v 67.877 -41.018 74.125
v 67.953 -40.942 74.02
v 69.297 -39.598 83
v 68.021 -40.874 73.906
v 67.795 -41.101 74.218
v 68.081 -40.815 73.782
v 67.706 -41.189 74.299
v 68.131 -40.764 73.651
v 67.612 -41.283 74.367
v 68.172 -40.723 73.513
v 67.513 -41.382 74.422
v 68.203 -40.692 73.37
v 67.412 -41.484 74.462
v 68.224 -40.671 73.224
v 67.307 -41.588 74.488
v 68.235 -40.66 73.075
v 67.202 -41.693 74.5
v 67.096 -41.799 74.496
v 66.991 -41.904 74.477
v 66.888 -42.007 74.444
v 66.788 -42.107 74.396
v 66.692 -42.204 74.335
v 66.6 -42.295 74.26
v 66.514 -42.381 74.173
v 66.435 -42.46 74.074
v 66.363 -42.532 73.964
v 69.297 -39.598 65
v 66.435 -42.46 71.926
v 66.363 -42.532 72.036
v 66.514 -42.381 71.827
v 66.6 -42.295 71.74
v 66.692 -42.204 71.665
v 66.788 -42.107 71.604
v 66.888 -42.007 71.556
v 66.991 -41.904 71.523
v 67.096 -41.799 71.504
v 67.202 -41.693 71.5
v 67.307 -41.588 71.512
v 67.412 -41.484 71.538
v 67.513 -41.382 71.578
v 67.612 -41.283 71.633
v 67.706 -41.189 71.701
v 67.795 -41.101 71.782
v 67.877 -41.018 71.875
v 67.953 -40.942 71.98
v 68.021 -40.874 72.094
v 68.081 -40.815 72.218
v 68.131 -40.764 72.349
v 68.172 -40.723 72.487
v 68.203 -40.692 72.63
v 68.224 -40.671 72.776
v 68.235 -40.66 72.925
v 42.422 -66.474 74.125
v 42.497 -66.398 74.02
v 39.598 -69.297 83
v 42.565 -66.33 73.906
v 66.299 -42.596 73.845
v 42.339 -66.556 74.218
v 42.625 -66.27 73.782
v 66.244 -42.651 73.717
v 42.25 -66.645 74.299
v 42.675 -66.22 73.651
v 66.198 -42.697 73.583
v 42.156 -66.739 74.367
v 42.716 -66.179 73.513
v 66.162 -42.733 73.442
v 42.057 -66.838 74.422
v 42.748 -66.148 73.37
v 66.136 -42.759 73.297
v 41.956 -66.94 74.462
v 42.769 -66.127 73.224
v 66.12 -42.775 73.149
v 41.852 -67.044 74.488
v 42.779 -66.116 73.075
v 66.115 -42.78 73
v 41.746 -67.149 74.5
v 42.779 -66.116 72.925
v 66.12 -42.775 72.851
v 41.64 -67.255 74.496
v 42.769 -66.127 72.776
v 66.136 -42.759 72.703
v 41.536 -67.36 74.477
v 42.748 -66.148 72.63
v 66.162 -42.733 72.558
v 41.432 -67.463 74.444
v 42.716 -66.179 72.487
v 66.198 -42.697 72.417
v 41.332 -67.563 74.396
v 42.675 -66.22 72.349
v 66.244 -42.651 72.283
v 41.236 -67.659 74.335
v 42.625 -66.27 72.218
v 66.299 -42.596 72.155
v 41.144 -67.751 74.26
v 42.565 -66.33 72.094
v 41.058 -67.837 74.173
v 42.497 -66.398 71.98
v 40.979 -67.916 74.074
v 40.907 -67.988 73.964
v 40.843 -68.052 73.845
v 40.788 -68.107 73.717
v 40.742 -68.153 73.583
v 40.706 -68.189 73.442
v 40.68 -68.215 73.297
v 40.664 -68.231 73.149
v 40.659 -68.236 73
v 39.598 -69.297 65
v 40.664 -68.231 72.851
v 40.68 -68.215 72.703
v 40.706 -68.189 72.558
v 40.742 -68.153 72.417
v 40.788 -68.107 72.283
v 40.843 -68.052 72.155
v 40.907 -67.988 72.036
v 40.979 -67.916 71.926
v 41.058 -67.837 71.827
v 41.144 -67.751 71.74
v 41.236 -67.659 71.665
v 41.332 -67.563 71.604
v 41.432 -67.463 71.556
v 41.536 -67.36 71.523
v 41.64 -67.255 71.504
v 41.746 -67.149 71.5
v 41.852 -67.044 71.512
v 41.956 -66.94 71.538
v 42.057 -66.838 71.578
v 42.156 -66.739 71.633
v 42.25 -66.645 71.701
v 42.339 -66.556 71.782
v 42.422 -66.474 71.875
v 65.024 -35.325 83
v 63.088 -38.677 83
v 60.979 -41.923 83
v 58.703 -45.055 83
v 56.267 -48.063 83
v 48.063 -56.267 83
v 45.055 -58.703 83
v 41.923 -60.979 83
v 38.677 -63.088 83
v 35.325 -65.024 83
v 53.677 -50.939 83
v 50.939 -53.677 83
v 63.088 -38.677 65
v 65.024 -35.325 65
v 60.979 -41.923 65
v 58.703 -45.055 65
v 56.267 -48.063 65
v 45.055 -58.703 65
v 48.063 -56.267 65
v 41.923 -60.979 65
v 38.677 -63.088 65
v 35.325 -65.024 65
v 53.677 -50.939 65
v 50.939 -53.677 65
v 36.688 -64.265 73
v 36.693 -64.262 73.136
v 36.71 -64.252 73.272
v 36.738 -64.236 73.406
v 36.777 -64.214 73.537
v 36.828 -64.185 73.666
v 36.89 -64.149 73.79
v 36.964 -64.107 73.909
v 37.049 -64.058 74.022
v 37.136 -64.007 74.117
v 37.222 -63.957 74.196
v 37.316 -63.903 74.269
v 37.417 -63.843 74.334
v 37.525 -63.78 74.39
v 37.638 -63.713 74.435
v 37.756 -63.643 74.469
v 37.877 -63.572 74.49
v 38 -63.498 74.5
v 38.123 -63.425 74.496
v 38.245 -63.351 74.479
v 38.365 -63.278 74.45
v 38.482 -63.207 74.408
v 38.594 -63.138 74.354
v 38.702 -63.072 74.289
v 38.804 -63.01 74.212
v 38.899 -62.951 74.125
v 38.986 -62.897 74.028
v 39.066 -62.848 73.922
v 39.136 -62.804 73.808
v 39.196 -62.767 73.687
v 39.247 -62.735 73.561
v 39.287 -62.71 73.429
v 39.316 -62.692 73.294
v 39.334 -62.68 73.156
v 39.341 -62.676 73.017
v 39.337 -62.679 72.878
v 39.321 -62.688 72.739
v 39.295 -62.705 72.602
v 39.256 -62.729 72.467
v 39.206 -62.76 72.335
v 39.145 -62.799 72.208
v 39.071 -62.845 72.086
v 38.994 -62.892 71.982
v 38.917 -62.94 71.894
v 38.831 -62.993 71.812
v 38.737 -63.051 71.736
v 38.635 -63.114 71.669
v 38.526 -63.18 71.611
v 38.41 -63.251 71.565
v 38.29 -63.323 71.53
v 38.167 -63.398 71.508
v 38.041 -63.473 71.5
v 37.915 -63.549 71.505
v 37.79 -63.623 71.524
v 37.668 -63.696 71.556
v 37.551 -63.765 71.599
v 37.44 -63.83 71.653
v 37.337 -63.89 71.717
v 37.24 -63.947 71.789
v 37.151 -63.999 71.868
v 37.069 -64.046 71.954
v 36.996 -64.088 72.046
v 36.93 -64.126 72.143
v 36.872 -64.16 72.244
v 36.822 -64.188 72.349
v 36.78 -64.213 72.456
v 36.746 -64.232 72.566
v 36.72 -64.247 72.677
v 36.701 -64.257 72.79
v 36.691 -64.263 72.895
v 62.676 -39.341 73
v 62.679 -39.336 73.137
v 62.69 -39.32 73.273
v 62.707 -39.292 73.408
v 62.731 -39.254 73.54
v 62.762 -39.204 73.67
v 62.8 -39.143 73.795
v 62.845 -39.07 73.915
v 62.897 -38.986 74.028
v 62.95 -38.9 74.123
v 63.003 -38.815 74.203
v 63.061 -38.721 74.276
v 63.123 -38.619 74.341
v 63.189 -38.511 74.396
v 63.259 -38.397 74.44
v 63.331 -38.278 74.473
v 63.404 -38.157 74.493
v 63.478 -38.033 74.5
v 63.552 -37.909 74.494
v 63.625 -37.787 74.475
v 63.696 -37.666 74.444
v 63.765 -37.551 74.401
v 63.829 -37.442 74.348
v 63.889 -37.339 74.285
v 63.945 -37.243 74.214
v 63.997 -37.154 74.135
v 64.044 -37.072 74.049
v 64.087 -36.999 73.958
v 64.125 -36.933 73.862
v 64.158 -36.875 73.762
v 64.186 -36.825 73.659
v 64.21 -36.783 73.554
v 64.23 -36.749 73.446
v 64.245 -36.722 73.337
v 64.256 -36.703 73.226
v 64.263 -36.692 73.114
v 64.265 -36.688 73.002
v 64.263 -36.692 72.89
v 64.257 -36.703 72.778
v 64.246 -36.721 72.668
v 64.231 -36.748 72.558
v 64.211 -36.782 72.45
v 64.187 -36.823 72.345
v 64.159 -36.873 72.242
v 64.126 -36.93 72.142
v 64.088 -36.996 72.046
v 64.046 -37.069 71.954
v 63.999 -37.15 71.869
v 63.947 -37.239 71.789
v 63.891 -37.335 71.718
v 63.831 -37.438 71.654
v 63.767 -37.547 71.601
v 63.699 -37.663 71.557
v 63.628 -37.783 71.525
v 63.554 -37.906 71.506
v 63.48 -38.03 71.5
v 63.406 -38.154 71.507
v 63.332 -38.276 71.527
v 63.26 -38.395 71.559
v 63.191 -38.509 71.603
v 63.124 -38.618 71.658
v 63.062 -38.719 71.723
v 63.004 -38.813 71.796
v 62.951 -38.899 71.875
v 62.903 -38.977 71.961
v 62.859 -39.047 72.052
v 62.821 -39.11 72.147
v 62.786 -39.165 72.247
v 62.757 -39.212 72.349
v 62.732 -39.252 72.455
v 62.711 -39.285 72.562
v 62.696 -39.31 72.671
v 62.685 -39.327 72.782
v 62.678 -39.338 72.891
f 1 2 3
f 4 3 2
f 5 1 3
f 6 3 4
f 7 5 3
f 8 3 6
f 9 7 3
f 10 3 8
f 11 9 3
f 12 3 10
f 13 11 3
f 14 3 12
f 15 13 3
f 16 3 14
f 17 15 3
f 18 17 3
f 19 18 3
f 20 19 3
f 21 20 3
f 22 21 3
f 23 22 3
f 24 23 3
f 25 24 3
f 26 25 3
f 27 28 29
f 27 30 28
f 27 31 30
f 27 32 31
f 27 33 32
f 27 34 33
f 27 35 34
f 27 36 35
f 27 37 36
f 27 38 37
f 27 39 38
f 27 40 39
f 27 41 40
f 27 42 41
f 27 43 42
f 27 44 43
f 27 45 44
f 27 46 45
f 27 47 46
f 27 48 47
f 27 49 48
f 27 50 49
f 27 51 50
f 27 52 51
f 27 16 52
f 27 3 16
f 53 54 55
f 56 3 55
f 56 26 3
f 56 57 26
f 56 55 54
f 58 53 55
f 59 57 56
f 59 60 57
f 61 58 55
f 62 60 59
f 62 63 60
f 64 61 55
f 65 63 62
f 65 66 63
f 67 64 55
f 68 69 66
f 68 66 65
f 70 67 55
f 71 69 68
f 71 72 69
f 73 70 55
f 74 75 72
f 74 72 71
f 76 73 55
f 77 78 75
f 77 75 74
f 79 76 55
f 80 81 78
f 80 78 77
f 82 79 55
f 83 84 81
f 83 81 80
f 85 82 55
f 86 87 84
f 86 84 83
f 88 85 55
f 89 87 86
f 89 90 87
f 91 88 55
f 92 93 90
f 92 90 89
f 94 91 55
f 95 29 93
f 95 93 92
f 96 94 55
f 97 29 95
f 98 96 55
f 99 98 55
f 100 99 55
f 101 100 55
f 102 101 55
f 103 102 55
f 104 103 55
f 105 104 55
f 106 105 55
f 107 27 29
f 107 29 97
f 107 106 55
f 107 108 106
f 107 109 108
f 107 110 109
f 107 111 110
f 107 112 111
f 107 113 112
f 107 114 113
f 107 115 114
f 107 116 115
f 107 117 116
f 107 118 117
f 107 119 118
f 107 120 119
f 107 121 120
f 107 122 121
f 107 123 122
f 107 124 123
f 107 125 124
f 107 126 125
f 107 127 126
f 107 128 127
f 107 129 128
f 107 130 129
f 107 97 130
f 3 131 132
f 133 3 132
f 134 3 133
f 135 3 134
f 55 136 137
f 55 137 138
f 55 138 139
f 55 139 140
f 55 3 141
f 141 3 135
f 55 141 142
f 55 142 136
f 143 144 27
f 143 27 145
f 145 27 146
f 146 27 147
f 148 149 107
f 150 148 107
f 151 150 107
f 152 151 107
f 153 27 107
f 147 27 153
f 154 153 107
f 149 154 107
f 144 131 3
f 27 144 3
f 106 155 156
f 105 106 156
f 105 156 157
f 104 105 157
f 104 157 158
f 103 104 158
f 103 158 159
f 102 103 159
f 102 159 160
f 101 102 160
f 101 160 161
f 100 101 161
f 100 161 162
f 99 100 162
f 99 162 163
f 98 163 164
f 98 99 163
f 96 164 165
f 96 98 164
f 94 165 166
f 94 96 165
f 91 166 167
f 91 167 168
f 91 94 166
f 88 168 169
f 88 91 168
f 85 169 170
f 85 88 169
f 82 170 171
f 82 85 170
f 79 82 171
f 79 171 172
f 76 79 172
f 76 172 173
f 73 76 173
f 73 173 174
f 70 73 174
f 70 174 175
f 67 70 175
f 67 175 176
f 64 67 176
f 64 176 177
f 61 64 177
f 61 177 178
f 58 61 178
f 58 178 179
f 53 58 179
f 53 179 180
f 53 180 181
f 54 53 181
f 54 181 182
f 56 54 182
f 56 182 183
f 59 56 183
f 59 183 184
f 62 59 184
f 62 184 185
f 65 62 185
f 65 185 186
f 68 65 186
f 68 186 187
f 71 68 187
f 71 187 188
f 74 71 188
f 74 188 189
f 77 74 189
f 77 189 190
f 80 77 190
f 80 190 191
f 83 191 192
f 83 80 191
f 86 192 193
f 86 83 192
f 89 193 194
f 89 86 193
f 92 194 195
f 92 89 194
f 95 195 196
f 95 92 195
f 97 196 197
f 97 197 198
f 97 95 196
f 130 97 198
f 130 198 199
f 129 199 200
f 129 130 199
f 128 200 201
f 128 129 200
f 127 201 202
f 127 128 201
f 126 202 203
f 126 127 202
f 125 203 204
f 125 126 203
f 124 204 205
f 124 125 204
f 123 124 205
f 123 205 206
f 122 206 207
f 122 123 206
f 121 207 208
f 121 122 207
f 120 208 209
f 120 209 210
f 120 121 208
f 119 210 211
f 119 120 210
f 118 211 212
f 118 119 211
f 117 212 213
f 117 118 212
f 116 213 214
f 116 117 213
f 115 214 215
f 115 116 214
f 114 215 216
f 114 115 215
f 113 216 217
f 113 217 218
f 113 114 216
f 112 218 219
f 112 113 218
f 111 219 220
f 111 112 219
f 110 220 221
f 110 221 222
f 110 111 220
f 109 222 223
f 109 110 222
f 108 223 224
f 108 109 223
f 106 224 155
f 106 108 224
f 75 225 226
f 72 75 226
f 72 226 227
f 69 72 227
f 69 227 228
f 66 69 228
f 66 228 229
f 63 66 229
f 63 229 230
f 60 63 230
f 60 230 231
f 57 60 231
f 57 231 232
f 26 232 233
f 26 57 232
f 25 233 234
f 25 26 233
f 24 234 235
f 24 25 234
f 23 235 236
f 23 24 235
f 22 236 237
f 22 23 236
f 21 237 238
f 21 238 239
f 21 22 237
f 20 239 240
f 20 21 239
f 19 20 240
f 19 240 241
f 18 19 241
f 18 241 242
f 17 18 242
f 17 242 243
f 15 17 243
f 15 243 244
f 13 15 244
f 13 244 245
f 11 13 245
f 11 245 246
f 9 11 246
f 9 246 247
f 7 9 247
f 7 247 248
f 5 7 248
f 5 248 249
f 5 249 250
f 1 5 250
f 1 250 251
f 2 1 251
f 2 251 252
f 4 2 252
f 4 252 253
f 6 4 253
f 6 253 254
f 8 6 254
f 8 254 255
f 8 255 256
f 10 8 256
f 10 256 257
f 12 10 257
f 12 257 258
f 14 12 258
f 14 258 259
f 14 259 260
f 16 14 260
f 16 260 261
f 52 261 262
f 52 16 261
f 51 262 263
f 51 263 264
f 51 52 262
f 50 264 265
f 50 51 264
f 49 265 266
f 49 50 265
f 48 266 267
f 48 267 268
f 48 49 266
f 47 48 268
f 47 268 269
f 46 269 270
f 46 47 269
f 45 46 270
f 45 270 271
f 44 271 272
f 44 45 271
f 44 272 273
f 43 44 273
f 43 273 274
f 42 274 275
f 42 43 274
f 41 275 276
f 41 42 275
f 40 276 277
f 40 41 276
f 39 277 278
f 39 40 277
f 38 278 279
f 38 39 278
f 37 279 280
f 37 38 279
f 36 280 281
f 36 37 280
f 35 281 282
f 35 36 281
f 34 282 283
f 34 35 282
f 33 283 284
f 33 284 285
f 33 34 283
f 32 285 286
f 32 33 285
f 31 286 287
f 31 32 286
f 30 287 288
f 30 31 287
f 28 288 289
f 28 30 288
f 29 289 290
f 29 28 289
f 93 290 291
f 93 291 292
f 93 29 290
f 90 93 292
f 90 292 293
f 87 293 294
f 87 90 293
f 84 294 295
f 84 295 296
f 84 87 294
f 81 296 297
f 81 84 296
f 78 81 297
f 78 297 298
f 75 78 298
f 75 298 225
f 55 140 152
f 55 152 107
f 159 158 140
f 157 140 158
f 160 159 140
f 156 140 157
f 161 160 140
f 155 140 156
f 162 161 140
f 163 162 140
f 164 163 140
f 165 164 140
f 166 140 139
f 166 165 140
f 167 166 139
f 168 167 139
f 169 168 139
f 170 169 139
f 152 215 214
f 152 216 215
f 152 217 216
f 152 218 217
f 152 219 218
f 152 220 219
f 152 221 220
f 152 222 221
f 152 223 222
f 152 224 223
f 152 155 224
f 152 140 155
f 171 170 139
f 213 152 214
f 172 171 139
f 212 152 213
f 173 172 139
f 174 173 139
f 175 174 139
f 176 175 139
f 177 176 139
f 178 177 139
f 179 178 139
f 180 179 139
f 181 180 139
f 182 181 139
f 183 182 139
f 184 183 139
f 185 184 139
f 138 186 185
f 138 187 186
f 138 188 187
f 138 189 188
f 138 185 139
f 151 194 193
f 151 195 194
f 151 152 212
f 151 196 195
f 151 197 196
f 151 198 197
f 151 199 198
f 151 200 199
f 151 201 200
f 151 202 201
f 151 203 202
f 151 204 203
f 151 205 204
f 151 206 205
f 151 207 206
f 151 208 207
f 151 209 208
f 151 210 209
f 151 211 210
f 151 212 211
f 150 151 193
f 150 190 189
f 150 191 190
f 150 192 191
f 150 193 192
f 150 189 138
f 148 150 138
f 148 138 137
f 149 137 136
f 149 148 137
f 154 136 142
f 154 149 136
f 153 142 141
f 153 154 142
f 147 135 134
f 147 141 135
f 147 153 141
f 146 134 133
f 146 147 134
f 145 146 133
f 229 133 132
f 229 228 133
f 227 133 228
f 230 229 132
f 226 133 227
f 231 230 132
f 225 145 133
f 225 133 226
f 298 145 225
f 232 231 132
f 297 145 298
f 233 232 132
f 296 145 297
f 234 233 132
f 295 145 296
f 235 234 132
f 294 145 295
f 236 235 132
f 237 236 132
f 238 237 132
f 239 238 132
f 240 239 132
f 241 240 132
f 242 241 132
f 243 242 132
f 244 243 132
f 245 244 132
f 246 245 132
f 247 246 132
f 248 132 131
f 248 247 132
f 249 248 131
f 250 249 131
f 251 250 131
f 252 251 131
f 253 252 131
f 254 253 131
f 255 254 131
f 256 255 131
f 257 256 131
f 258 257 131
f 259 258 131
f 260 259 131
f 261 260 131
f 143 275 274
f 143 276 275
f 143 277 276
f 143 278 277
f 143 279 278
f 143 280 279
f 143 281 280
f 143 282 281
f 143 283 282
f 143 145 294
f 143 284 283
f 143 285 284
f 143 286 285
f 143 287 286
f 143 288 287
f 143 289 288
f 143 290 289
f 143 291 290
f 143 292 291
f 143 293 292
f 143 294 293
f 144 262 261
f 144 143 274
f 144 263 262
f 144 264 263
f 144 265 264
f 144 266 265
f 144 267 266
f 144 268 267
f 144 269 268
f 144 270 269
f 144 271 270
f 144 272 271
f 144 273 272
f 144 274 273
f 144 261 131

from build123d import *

# Parameters (mm, degrees)
CYLINDER1768_R              = 1.5
CYLINDER1768_DEPTH          = 60
CYLINDER1765_R              = 1.5
CYLINDER1765_DEPTH          = 60
CYLINDER1766_R              = 1.5
CYLINDER1766_DEPTH          = 60
CYLINDER1767_R              = 1.5
CYLINDER1767_DEPTH          = 60
COMPOUND900_PLACEMENT_ANGLE = 225
CYLINDER1771_R              = 1.5
CYLINDER1771_DEPTH          = 50
COMPOUND903_PLACEMENT_ANGLE = 225
CYLINDER1770_R              = 1.5
CYLINDER1770_DEPTH          = 50
COMPOUND904_PLACEMENT_ANGLE = 225
CYLINDER1769_R              = 74
CYLINDER1769_DEPTH          = 40
BOX718_W                    = 42
BOX718_H                    = 10
BOX718_DEPTH                = 18
COMPOUND901_PLACEMENT_ANGLE = 225


with BuildPart() as v_lec1768:
    # Cylinder1768 → Cylinder1768 (new body)
    with BuildSketch(Plane(origin=(-24, 73, -80), x_dir=(1, 0, 0), z_dir=(0, 0, 1))):
        Circle(CYLINDER1768_R)
    extrude(amount=CYLINDER1768_DEPTH)


with BuildPart() as v_lec1765:
    # Cylinder1765 → Cylinder1765 (new body)
    with BuildSketch(Plane(origin=(-15, 135, -80), x_dir=(1, 0, 0), z_dir=(0, 0, 1))):
        Circle(CYLINDER1765_R)
    extrude(amount=CYLINDER1765_DEPTH)


with BuildPart() as v_lec1766:
    # Cylinder1766 → Cylinder1766 (new body)
    with BuildSketch(Plane(origin=(15, 135, -80), x_dir=(1, 0, 0), z_dir=(0, 0, 1))):
        Circle(CYLINDER1766_R)
    extrude(amount=CYLINDER1766_DEPTH)


with BuildPart() as compound900:
    # Cylinder1767 → Cylinder1767 (new body)
    with BuildSketch(Plane(origin=(24, 73, -80), x_dir=(1, 0, 0), z_dir=(0, 0, 1))):
        Circle(CYLINDER1767_R)
    extrude(amount=CYLINDER1767_DEPTH)

    # Compound900: union Válec1768, Válec1765, Válec1766
    add(v_lec1768.part)
    add(v_lec1765.part)
    add(v_lec1766.part)


with BuildPart() as compound900_1:
    # Compound900 placement: moved
    add(compound900.part.moved(Location((0, 0, 100))).rotate(Axis((0, 0, 100), (0, 0, 1)), COMPOUND900_PLACEMENT_ANGLE))


with BuildPart() as compound903:
    # Cylinder1771 → Cylinder1771 (new body)
    with BuildSketch(Plane(origin=(18, 100, 72), x_dir=(1, 0, 0), z_dir=(0, -1, 0))):
        Circle(CYLINDER1771_R)
    extrude(amount=CYLINDER1771_DEPTH)


with BuildPart() as compound903_1:
    # Compound903 placement: moved
    add(compound903.part.rotate(Axis((0, 0, 0), (0, 0, 1)), COMPOUND903_PLACEMENT_ANGLE))


with BuildPart() as compound902:
    # Cylinder1770 → Cylinder1770 (new body)
    with BuildSketch(Plane(origin=(-18, 100, 72), x_dir=(1, 0, 0), z_dir=(0, -1, 0))):
        Circle(CYLINDER1770_R)
    extrude(amount=CYLINDER1770_DEPTH)


with BuildPart() as compound902_1:
    # Compound904 placement: moved
    add(compound902.part.rotate(Axis((0, 0, 0), (0, 0, 1)), COMPOUND904_PLACEMENT_ANGLE))

    # Compound902: union Compound903
    add(compound903_1.part)


with BuildPart() as compound902_2:
    # Compound902 placement: moved
    add(compound902_1.part.moved(Location((0, 0, 1))))


with BuildPart() as v_lec1769:
    # Cylinder1769 → Cylinder1769 (new body)
    with BuildSketch(Plane.XY.offset(44)):
        Circle(CYLINDER1769_R)
    extrude(amount=CYLINDER1769_DEPTH)


with BuildPart() as cut527:
    # Box718 → Box718 (new body)
    with BuildSketch(Plane(origin=(-21, -23, 22), x_dir=(1, 0, 0), z_dir=(0, 0, 1))):
        with Locations((21, 5)):
            Rectangle(BOX718_W, BOX718_H)
    extrude(amount=BOX718_DEPTH)


with BuildPart() as cut527_1:
    # Compound901 placement: moved
    add(cut527.part.moved(Location((63.64, -63.64, 43))).rotate(Axis((63.64, -63.64, 43), (0, 0, 1)), COMPOUND901_PLACEMENT_ANGLE))

    # Cut525: cut Válec1769
    add(v_lec1769.part, mode=Mode.SUBTRACT)

    # Cut526: cut Compound902
    add(compound902_2.part, mode=Mode.SUBTRACT)

    # Cut527: cut Compound900
    add(compound900_1.part, mode=Mode.SUBTRACT)


solid = cut527_1.part
